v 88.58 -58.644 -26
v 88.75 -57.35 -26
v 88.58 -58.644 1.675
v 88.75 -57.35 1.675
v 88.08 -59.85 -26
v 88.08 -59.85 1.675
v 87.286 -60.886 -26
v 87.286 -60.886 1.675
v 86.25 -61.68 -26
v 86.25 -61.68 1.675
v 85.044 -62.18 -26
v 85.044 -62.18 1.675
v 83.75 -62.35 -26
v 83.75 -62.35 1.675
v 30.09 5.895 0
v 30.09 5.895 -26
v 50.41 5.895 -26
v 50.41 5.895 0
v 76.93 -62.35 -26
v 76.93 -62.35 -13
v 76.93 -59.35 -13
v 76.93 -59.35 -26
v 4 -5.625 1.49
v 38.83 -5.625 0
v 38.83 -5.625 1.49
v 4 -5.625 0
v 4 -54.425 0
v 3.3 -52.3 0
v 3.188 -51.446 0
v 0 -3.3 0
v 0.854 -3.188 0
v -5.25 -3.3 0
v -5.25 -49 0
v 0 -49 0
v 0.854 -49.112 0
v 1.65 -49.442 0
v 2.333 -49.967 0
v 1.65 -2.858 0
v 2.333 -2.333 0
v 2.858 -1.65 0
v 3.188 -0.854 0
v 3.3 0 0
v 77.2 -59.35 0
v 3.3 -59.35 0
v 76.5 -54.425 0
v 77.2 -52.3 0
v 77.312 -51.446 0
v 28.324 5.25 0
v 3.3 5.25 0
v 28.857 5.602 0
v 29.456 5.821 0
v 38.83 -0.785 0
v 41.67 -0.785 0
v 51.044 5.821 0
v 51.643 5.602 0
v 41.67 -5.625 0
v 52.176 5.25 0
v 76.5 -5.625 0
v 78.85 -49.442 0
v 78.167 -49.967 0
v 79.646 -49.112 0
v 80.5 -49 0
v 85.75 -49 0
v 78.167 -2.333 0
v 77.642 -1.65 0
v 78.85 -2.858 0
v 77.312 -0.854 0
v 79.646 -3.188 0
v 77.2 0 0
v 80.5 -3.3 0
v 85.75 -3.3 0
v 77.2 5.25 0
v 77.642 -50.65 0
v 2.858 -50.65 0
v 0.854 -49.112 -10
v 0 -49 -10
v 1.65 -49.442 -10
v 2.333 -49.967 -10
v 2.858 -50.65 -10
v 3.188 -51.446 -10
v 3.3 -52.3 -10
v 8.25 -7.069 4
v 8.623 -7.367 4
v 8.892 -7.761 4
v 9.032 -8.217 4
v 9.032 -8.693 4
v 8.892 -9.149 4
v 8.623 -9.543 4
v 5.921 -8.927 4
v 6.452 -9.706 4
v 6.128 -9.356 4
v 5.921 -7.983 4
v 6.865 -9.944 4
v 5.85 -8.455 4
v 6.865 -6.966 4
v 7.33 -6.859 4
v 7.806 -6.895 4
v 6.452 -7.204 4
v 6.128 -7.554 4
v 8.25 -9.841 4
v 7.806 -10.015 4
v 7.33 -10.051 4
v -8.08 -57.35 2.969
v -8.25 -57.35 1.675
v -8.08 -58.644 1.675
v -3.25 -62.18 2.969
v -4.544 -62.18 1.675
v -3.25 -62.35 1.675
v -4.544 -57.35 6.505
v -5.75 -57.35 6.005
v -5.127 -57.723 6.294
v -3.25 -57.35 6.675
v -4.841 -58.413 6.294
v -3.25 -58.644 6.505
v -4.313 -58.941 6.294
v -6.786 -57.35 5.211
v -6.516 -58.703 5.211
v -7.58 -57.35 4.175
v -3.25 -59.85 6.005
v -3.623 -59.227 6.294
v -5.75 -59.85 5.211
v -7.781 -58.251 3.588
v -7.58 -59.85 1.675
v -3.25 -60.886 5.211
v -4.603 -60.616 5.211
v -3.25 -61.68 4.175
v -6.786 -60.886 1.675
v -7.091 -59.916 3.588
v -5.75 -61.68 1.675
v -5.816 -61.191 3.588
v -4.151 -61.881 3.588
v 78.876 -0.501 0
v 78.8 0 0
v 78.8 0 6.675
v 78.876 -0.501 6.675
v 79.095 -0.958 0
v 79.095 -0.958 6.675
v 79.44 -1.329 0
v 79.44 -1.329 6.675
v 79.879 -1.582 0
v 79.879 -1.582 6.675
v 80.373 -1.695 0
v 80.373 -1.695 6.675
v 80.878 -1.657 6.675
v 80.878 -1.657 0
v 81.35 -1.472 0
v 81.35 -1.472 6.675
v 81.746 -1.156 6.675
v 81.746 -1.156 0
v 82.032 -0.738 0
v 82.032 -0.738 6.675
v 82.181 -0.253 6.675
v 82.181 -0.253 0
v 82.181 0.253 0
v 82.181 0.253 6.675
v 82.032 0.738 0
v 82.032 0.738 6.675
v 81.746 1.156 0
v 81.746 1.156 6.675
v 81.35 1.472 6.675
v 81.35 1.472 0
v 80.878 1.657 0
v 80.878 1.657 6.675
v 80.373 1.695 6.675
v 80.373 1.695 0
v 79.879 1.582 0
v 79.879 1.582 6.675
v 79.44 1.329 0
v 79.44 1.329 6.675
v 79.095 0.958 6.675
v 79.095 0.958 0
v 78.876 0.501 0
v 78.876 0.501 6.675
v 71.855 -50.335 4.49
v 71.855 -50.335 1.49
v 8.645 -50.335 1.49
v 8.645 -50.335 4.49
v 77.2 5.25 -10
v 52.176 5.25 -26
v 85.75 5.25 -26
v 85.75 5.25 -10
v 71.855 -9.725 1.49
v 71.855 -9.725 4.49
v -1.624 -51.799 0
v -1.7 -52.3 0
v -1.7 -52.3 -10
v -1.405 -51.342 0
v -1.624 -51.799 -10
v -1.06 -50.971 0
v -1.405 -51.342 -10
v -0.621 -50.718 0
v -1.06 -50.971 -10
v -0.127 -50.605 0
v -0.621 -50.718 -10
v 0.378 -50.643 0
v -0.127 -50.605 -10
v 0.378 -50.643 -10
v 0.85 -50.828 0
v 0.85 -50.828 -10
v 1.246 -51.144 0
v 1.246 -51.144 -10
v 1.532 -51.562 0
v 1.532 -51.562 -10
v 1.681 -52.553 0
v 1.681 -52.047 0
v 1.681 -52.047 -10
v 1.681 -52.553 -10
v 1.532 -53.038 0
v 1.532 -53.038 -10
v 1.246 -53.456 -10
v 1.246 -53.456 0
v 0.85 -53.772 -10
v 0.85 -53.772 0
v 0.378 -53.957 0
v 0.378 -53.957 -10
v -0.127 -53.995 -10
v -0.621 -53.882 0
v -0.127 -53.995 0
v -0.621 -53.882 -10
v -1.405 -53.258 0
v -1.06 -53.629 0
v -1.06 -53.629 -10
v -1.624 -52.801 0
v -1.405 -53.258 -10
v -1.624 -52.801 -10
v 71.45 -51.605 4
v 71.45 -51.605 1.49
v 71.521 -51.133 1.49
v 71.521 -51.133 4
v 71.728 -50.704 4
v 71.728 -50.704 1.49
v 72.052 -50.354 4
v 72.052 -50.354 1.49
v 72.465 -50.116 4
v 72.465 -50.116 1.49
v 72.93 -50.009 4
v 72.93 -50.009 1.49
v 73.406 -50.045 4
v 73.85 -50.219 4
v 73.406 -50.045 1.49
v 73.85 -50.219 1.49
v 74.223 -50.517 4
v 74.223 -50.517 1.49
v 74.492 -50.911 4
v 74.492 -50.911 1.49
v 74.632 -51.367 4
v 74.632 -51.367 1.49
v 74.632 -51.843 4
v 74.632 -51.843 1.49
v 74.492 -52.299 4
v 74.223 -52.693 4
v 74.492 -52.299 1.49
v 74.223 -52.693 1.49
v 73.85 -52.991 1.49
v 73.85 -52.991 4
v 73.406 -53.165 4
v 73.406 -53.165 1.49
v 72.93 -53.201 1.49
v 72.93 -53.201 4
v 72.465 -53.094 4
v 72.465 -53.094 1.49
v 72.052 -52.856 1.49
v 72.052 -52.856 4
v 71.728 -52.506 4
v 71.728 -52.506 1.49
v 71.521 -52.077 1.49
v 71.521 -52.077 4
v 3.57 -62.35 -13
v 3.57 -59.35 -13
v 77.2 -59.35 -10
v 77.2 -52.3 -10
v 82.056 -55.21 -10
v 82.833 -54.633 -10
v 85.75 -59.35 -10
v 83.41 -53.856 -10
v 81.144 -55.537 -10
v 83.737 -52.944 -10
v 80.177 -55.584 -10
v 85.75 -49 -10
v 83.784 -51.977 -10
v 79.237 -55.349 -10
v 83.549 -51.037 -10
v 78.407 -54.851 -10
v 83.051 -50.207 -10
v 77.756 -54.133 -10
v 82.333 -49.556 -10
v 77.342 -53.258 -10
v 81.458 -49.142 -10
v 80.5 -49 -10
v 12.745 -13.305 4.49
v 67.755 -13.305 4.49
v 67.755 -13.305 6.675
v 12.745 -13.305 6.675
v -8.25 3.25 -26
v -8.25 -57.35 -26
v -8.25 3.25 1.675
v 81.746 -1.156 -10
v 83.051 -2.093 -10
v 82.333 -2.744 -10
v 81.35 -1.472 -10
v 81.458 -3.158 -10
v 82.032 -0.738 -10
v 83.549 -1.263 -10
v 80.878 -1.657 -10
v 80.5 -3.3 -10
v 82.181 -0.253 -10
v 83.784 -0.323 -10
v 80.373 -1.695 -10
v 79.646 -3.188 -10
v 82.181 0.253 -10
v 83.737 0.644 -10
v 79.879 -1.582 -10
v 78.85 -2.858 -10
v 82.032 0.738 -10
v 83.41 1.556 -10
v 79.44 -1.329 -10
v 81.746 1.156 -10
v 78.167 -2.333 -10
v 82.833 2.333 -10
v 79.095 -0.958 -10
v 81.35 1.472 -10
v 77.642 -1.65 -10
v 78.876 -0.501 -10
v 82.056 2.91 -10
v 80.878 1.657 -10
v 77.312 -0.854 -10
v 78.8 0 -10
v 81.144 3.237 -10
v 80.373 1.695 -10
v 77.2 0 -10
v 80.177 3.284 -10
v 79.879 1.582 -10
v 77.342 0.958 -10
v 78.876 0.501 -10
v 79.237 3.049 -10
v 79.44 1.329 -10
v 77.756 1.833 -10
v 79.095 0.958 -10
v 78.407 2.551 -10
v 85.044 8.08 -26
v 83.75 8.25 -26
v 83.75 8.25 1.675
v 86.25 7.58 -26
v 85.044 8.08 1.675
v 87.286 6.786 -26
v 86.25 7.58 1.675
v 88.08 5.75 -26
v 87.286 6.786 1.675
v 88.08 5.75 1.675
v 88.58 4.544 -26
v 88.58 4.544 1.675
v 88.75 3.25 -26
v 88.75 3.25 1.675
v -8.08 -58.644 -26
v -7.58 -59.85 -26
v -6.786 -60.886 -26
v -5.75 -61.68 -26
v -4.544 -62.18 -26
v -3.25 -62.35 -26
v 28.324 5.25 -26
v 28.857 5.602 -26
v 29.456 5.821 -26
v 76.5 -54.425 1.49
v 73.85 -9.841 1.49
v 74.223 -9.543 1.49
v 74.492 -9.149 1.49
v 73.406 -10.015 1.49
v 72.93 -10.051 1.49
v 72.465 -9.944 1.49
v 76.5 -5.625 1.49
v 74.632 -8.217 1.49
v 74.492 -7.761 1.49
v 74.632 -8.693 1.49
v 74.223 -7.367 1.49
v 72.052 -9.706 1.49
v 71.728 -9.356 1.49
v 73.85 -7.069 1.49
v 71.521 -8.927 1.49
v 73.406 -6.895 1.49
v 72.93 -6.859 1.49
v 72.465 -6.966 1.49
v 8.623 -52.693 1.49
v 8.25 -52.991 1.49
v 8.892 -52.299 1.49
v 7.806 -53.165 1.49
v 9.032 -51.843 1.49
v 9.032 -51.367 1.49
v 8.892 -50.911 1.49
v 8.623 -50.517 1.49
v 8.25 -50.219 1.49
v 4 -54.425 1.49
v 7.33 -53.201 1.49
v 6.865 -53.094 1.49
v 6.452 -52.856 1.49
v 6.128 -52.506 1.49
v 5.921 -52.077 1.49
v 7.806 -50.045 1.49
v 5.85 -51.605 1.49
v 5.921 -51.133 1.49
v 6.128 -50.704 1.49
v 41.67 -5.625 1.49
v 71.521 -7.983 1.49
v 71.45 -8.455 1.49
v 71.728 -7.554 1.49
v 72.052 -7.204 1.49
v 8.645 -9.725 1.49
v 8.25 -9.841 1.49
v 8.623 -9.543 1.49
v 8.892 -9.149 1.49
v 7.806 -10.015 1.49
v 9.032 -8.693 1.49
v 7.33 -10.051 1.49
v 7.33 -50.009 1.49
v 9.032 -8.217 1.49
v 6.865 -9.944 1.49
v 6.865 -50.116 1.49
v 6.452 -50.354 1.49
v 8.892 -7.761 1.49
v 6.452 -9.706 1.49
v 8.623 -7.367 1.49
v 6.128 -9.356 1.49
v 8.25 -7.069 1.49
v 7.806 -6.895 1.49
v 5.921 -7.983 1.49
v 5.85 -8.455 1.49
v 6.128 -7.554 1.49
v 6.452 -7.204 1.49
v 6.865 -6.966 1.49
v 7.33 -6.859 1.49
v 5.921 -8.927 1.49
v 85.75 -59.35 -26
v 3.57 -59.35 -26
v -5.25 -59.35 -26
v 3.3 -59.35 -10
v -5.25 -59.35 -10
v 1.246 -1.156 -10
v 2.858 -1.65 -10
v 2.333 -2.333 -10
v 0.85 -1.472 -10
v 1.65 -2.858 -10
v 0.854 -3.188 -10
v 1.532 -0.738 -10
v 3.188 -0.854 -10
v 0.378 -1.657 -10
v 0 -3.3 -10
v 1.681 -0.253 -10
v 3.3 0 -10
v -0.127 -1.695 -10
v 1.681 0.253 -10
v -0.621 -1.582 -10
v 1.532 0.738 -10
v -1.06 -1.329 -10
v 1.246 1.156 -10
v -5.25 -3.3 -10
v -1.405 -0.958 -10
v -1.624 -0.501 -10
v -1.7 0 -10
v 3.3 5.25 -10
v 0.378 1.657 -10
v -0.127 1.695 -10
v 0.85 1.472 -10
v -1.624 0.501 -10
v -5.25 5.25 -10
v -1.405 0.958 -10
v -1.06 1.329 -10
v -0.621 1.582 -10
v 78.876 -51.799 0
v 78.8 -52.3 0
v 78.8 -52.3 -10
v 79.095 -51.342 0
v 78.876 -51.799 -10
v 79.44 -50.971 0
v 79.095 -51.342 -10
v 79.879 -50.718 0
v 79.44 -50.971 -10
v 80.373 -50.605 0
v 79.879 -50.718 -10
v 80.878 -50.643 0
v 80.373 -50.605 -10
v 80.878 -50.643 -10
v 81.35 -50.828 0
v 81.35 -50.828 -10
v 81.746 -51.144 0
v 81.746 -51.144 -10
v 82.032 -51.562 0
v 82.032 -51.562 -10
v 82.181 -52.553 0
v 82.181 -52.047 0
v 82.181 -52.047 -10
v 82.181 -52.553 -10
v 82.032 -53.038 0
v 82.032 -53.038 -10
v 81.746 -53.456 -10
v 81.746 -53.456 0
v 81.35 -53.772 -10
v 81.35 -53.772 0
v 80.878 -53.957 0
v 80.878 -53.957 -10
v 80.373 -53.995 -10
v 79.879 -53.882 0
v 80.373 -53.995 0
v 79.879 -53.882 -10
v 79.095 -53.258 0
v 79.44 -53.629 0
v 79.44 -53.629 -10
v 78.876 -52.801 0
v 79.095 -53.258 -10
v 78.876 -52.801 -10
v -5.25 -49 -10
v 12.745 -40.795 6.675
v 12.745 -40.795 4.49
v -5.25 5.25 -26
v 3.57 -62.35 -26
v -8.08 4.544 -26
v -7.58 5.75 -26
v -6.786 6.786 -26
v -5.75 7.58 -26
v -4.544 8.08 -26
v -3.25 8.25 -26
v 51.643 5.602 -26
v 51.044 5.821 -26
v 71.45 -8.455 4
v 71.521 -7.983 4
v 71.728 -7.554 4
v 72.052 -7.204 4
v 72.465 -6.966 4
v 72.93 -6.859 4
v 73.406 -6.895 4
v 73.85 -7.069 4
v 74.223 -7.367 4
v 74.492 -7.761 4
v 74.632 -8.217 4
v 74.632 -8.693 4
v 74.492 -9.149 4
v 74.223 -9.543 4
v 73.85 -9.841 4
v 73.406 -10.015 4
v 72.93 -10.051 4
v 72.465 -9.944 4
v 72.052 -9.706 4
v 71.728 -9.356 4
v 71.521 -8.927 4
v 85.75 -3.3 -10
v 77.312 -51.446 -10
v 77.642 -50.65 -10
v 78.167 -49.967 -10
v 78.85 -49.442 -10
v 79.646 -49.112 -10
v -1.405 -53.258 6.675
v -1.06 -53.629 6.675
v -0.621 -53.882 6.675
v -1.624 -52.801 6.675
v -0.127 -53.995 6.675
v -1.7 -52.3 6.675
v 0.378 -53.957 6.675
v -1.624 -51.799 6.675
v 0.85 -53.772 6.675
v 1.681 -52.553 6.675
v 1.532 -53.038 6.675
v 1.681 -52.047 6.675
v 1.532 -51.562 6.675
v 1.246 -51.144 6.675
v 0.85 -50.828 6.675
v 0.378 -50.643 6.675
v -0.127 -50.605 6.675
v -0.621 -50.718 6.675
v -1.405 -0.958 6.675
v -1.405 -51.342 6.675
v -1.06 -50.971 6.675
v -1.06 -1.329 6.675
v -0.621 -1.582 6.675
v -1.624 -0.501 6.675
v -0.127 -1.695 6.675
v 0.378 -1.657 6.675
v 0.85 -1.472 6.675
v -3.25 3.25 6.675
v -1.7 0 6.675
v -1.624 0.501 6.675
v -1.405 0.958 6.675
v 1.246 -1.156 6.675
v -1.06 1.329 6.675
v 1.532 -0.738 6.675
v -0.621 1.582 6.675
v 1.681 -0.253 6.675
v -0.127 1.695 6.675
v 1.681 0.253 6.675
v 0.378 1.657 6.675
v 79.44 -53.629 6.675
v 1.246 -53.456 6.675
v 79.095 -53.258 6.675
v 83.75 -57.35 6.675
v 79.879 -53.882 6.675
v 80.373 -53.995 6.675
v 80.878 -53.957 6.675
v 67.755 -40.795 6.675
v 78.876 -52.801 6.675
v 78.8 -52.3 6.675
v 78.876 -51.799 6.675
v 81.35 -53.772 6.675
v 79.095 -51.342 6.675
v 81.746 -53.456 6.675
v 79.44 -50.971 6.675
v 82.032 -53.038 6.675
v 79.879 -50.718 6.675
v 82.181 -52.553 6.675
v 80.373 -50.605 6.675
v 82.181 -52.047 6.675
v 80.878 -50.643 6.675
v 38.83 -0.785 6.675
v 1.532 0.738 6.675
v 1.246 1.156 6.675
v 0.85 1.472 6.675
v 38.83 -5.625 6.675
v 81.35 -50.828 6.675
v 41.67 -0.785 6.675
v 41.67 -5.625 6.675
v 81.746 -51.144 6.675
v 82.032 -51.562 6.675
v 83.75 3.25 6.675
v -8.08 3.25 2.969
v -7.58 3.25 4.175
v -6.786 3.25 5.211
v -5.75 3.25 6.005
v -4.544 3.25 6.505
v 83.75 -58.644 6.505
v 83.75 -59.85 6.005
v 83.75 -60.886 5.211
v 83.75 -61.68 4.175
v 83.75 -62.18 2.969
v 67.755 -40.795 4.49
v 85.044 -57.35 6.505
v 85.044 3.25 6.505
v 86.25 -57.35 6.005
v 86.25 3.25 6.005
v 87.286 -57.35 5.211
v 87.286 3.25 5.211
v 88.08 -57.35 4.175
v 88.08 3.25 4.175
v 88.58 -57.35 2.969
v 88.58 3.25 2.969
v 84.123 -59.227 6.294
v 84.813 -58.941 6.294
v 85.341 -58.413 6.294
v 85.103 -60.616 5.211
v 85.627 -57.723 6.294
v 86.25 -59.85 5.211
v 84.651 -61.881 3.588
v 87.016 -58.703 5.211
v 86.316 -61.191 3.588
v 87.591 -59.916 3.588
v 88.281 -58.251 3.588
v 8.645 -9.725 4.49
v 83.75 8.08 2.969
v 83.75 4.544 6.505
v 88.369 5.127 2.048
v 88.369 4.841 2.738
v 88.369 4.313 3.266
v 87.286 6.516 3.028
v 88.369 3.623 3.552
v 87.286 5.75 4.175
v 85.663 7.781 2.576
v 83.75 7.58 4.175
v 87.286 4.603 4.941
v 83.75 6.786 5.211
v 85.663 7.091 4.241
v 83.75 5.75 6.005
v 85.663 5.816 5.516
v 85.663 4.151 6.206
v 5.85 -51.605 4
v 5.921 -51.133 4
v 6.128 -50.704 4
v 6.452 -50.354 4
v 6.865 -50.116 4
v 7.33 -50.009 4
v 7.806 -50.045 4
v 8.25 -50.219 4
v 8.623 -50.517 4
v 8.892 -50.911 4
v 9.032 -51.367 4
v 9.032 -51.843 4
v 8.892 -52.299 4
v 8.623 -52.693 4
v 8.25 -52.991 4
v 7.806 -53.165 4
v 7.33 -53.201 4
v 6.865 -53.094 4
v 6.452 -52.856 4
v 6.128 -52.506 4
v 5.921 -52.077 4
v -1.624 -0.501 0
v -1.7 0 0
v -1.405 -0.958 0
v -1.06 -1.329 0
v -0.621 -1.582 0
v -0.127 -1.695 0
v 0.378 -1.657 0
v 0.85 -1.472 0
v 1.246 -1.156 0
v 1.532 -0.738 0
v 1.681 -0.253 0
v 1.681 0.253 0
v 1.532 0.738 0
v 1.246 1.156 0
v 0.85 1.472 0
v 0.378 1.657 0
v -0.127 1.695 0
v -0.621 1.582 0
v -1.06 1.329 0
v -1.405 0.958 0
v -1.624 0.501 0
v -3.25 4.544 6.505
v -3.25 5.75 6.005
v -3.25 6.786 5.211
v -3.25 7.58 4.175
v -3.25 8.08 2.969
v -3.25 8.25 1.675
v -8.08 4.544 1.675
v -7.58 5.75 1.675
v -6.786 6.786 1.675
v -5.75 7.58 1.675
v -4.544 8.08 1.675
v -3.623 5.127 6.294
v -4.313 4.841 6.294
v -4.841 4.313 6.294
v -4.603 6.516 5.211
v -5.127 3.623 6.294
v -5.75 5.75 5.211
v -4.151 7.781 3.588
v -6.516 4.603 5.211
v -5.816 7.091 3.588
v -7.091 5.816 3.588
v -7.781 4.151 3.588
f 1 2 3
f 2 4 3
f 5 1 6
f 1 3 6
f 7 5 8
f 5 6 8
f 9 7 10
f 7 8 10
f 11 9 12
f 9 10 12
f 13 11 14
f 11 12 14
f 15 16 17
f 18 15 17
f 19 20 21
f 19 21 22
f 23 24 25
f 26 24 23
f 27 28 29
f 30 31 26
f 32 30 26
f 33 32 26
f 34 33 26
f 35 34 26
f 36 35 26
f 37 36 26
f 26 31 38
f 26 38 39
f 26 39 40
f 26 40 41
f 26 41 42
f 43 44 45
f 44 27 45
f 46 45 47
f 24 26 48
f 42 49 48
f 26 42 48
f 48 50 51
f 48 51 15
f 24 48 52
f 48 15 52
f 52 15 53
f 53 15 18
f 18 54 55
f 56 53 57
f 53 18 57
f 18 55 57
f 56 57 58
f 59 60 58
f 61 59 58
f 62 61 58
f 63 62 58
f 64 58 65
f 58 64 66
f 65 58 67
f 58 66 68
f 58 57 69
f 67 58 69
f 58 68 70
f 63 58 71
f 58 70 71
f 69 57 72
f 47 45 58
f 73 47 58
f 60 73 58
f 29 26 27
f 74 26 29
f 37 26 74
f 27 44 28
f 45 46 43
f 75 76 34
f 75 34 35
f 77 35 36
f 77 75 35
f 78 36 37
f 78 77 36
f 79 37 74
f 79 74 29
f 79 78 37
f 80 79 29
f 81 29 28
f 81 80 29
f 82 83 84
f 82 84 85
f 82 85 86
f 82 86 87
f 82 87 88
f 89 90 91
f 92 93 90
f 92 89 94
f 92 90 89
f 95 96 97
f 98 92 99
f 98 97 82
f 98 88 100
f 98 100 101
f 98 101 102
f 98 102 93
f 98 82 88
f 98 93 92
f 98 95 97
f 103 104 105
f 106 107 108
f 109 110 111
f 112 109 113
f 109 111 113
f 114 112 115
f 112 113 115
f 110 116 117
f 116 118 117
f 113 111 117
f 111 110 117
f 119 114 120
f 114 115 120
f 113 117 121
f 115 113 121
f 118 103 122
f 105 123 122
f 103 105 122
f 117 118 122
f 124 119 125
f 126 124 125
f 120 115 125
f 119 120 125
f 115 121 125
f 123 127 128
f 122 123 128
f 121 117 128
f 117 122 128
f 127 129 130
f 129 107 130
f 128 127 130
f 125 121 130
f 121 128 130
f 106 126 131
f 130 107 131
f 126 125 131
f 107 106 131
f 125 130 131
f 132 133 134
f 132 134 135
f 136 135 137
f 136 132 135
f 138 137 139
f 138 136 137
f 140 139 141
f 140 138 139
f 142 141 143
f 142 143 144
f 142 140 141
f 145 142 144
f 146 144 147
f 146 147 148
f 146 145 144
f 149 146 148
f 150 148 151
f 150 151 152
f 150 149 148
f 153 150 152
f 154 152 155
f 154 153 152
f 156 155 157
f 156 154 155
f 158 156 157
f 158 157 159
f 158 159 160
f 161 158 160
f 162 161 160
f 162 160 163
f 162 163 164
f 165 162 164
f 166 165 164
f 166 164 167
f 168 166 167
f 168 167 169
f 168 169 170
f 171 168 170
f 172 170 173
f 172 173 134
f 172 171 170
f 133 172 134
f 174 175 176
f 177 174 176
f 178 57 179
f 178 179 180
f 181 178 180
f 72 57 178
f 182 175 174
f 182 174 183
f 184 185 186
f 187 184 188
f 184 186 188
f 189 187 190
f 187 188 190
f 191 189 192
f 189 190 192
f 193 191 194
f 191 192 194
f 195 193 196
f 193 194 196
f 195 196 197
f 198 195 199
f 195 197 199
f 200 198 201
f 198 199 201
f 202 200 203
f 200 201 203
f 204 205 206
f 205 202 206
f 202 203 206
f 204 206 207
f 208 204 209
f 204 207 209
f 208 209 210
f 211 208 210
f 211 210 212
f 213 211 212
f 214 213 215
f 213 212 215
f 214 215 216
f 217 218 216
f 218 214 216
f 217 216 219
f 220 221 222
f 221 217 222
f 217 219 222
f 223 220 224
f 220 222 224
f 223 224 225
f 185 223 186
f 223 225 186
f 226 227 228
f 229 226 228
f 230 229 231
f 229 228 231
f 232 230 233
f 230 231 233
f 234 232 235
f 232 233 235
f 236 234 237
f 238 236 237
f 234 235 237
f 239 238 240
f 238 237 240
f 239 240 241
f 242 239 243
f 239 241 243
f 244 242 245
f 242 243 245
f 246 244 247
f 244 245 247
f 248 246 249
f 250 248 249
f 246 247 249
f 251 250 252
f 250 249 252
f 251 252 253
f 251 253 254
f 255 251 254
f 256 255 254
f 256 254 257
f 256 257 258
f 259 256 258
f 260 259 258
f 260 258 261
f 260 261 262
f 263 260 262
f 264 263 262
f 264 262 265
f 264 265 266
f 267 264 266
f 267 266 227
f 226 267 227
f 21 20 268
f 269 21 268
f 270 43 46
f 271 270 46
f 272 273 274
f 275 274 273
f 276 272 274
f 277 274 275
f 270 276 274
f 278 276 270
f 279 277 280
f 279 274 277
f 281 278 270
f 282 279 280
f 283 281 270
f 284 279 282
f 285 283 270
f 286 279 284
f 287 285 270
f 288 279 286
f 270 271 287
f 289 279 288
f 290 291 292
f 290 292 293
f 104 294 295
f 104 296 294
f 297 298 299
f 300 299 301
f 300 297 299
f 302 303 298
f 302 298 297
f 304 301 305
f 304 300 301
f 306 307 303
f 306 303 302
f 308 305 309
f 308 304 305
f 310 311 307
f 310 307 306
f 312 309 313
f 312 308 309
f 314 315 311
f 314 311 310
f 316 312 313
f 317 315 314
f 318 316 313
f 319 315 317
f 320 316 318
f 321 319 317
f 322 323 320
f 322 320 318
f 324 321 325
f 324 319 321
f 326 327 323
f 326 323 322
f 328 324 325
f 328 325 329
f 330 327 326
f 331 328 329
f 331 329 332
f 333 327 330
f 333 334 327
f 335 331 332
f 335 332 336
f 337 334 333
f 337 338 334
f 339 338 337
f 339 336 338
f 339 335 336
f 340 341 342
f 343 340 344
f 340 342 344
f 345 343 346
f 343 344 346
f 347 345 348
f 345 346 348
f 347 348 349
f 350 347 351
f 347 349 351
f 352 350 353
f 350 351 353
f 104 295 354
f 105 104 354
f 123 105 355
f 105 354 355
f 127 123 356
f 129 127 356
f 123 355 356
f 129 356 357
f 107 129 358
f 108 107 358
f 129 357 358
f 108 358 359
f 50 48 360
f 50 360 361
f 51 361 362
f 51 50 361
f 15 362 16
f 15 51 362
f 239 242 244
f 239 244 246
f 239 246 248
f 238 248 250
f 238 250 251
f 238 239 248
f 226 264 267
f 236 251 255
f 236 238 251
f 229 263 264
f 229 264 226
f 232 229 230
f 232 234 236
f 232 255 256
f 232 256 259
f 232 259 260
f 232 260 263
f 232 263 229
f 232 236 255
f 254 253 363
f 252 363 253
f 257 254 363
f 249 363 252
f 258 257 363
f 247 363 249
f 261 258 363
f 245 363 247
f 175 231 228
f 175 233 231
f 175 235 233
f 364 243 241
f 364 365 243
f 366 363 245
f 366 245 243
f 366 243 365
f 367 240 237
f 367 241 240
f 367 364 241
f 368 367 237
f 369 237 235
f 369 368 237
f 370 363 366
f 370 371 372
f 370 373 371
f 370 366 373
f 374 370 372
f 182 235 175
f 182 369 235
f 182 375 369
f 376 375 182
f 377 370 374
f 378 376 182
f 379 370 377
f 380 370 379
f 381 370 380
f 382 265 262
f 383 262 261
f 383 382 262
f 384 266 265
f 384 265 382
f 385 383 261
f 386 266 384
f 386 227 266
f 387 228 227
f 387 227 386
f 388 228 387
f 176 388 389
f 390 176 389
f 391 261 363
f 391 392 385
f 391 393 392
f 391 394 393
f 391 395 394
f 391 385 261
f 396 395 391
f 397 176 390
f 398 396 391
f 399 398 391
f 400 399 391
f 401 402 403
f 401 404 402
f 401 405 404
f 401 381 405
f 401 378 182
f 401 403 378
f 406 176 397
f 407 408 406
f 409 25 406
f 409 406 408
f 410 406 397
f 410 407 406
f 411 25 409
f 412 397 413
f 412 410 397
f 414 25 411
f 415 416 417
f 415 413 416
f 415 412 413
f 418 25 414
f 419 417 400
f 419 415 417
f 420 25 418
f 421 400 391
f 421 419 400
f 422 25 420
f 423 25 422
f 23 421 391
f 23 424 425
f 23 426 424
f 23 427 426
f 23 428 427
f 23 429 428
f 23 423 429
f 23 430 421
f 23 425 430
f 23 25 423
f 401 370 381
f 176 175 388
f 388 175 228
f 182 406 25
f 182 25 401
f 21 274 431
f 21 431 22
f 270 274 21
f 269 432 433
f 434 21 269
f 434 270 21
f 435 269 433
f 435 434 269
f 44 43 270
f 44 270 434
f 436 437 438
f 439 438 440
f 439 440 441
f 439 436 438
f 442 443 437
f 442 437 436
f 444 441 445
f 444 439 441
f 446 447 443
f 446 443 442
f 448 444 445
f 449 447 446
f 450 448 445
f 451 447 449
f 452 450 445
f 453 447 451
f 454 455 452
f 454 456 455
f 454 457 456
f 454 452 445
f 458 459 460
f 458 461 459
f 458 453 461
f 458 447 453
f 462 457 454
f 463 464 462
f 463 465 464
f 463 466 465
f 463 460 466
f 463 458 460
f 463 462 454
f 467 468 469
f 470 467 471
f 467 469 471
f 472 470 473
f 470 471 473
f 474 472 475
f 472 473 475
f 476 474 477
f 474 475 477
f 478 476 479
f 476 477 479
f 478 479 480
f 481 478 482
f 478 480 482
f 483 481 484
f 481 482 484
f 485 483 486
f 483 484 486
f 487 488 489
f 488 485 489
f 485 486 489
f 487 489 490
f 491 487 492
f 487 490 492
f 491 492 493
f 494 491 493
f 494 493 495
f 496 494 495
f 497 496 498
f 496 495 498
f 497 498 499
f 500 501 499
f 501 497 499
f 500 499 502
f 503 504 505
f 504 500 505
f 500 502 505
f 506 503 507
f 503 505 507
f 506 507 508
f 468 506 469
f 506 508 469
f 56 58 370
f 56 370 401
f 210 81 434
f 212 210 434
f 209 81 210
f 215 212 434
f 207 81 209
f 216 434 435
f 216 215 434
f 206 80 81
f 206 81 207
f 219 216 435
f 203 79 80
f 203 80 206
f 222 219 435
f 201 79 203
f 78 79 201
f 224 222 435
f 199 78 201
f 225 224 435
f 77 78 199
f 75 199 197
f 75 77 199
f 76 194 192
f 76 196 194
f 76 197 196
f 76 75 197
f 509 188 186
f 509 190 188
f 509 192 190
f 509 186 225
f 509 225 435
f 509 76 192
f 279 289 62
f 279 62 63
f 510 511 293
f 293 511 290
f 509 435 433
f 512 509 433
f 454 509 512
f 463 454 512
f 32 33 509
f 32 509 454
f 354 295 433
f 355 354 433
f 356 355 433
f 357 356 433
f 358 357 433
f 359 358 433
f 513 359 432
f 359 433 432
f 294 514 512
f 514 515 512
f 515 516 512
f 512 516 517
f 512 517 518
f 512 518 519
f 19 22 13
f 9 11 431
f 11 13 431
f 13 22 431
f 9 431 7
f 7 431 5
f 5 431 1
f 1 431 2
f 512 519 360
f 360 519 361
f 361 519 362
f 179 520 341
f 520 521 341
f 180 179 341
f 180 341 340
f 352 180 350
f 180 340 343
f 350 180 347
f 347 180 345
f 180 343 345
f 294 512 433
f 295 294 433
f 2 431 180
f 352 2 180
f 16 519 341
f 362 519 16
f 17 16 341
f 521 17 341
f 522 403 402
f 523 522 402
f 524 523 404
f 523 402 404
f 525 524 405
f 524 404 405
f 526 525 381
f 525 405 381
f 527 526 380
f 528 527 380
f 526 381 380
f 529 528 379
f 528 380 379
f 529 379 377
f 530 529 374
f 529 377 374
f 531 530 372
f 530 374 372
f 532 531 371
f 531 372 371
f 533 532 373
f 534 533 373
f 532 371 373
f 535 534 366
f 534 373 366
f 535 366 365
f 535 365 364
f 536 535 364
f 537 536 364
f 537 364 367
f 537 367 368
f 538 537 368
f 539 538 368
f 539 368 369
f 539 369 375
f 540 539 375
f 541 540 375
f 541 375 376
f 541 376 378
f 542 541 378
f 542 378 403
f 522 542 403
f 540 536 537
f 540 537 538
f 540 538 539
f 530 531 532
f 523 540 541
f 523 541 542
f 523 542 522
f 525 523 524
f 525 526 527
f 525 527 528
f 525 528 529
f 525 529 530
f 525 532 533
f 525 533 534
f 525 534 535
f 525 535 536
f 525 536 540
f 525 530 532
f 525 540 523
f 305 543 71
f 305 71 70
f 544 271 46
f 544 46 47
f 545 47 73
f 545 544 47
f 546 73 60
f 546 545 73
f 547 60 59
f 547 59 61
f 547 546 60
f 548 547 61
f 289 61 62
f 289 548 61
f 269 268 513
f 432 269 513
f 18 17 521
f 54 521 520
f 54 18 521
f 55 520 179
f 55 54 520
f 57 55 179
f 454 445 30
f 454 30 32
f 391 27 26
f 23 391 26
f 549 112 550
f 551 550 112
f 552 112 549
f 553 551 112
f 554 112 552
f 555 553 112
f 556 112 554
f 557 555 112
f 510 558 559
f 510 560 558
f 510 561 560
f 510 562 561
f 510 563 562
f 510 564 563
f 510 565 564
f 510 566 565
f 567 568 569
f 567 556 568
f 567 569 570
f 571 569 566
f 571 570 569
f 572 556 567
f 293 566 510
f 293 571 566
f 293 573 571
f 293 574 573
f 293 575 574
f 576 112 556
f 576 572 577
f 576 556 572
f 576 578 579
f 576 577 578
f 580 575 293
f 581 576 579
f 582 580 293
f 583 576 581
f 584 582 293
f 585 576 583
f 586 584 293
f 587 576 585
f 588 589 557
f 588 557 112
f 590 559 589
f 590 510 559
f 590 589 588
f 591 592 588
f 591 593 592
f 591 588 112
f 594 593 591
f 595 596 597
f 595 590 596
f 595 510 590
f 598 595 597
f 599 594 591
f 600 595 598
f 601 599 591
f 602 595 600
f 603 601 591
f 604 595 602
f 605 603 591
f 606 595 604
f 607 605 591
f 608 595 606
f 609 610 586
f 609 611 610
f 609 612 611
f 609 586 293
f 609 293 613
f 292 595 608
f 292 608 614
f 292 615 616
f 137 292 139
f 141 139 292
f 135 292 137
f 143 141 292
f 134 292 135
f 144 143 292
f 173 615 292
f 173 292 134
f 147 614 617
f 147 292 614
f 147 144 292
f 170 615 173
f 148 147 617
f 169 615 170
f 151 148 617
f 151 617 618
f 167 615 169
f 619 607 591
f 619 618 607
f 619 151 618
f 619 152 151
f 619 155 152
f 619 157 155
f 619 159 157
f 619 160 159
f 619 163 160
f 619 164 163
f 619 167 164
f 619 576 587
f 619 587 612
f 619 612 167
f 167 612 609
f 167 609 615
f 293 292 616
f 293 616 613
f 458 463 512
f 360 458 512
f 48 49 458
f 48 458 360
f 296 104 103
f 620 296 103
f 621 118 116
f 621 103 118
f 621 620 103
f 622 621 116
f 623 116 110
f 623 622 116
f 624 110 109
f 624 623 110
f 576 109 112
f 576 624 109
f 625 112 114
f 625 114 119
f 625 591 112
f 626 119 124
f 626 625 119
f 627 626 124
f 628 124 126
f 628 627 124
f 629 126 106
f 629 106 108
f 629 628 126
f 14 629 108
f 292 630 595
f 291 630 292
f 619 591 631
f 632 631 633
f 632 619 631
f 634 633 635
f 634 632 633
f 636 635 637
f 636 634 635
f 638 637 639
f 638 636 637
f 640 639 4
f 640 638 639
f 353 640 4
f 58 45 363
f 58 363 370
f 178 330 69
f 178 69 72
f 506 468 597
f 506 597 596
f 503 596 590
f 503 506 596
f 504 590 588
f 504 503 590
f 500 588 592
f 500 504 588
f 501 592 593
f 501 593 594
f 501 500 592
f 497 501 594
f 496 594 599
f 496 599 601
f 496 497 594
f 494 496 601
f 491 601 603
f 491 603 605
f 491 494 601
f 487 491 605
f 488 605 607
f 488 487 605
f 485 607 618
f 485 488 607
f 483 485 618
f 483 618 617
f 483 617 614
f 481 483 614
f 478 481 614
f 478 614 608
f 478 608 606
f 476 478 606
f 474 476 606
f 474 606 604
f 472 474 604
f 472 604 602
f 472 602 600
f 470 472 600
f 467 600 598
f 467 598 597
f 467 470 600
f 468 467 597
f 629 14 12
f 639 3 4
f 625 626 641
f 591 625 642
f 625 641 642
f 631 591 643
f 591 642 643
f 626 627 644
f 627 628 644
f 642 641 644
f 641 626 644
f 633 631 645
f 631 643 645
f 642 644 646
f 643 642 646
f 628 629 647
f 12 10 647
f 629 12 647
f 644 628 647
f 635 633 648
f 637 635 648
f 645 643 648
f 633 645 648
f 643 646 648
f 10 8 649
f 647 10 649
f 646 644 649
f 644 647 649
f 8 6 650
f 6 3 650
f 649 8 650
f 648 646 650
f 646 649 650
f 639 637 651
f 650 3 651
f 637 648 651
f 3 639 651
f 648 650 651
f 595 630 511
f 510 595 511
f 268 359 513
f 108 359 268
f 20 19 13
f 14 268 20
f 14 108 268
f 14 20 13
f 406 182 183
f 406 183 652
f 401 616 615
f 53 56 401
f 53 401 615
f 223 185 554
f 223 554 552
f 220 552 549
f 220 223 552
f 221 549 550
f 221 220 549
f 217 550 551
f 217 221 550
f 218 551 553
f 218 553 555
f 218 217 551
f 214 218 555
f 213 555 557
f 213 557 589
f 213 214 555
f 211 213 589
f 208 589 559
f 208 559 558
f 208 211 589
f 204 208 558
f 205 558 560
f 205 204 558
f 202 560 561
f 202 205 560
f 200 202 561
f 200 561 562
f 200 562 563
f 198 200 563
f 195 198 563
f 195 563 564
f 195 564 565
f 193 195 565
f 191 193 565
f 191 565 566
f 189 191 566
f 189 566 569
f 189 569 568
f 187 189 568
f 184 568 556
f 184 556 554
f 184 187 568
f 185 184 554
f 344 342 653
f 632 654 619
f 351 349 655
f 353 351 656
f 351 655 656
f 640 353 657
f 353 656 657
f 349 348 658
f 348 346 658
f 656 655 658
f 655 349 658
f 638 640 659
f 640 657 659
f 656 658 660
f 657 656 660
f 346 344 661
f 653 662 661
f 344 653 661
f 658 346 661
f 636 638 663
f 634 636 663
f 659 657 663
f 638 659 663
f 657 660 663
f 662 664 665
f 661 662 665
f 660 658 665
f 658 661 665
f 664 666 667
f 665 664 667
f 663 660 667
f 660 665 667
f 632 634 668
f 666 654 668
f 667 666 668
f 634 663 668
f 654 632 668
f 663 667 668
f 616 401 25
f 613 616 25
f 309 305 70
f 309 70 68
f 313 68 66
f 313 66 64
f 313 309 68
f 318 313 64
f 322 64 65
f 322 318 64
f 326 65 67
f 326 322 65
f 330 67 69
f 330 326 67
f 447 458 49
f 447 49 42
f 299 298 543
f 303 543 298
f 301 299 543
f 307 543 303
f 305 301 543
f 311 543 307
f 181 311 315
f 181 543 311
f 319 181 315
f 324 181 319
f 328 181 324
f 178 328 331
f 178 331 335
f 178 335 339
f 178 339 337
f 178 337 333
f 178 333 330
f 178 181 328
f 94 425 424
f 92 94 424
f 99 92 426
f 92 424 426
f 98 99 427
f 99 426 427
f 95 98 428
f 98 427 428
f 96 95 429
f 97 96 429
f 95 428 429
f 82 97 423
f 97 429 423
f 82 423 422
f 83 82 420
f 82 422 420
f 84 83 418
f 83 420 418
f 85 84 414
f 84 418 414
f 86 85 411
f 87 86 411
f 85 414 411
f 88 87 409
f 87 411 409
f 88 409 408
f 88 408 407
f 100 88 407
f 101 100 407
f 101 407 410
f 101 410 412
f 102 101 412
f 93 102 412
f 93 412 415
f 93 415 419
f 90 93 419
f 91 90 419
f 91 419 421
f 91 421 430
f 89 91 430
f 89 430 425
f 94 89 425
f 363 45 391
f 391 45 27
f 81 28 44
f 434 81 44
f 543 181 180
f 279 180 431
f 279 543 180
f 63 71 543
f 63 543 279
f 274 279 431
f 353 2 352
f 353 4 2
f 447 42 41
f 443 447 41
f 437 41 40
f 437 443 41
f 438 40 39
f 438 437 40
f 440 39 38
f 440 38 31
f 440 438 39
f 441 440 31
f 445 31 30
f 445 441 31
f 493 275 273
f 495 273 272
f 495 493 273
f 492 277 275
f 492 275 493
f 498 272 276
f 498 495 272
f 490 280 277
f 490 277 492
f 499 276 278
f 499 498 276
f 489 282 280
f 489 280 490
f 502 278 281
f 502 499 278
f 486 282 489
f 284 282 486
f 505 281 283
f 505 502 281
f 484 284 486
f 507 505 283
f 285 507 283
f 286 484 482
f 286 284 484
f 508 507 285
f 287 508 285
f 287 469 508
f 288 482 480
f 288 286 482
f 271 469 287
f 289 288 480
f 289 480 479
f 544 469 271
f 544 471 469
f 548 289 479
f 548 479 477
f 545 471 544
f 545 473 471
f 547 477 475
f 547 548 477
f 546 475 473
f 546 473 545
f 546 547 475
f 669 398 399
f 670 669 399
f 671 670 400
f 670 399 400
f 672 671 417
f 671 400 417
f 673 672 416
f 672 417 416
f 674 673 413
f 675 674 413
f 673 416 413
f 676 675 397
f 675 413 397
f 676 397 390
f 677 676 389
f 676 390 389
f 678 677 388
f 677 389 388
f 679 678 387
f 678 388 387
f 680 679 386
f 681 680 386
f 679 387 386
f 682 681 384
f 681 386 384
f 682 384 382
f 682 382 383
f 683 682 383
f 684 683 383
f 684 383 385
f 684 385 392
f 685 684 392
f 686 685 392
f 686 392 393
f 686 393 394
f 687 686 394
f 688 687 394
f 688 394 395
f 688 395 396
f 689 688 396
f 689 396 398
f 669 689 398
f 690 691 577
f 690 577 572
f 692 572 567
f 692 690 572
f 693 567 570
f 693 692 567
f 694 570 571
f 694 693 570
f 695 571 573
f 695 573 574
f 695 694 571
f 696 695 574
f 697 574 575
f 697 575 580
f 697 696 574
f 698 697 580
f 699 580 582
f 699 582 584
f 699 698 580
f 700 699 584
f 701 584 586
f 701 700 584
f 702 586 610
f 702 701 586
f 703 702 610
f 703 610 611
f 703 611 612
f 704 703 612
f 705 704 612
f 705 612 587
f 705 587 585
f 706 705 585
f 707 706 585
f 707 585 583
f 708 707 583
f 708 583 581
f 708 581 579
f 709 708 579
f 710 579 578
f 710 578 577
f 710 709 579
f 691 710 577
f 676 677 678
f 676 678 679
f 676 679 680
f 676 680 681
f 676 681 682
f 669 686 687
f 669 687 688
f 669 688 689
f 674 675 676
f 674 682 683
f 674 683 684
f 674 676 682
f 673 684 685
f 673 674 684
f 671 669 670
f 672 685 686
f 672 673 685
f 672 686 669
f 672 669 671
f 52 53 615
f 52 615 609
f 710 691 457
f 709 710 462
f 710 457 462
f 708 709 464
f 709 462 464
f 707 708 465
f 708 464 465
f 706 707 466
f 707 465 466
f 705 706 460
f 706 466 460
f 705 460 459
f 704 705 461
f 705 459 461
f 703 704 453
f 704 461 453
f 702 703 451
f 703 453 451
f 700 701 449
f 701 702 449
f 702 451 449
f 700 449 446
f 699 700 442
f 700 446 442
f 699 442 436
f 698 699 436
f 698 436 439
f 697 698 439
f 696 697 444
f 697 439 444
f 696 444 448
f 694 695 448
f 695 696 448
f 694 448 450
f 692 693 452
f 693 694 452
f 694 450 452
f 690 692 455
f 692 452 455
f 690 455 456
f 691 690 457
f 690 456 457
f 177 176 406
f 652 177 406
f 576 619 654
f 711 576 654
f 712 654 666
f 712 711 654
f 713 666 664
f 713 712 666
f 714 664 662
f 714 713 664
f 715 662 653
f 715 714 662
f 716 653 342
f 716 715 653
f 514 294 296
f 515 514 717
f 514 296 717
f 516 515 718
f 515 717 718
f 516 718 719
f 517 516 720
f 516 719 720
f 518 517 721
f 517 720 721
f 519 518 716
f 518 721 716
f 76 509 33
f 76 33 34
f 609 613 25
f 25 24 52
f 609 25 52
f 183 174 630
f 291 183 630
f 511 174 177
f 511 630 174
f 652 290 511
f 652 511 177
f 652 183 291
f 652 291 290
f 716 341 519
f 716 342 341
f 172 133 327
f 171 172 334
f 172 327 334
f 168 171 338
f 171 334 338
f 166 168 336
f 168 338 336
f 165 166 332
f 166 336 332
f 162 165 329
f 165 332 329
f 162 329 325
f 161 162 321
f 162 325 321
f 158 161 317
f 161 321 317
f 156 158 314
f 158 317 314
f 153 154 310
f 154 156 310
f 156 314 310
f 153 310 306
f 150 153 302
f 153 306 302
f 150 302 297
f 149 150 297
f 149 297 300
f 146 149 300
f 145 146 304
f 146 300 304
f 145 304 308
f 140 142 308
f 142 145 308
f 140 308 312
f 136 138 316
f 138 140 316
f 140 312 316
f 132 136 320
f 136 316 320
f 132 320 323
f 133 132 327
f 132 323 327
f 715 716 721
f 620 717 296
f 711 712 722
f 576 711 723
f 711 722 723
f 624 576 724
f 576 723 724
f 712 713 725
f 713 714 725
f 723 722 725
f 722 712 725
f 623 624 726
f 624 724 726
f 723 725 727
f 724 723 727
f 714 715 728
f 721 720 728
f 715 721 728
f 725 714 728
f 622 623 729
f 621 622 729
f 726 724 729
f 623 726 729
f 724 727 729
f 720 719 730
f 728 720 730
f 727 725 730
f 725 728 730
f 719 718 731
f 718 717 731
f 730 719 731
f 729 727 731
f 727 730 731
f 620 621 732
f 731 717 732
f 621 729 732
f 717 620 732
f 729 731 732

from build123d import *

# Parameters (mm, degrees)
SKETCH1_W           = 45.1
SKETCH1_H           = 63.8
SKETCH1_R           = 1.7
SKETCH1_W_2         = 0.4
SKETCH1_W_3         = 3
BOSS_EXTRUDE1_DEPTH = 6.675
SKETCH1_4_W         = 3
SKETCH1_4_H         = 63.8
BOSS_EXTRUDE2_DEPTH = 26
FILLET1_R           = 5
SKETCH3_W           = 73.36
SKETCH3_H           = 13
CUT_EXTRUDE4_DEPTH  = 3
SKETCH13_W          = 55.01
SKETCH13_H          = 27.49
CUT_EXTRUDE17_DEPTH = 112.535128995
SKETCH8_W           = 72.5
SKETCH8_H           = 48.8
CUT_EXTRUDE11_DEPTH = 1.49
SKETCH5_R           = 1.6
CUT_EXTRUDE8_DEPTH  = 4
CUT_EXTRUDE9_START  = -1.49
SKETCH7_W           = 63.21
SKETCH7_H           = 40.61
SKETCH7_W_2         = 62.41
SKETCH7_H_2         = 39.81
CUT_EXTRUDE9_DEPTH  = 3
SKETCH9_W           = 2.84
SKETCH9_H           = 4.84
SKETCH9_W_2         = 2.44
SKETCH9_H_2         = 4.44
CUT_EXTRUDE15_DEPTH = 112.535128995
SKETCH14_R          = 2.54
CUT_EXTRUDE19_DEPTH = 112.535128995
BOSS_EXTRUDE4_START = 10
SKETCH15_R          = 3.3
SKETCH15_R_2        = 1.7
BOSS_EXTRUDE4_DEPTH = 10


with BuildPart() as part:
    # Sketch1 → Boss-Extrude1 (new body)
    # profile 1 of 10: a face of its own
    with BuildSketch(Plane.XY):
        Polygon((40.25, 4.85), (85.35, 4.85), (85.75, 4.85), (85.75, 5.25), (-5.25, 5.25), (-5.25, 4.85), (-4.85, 4.85), align=None)
    # profile 2 of 10: a face of its own
    with BuildSketch(Plane.XY):
        with Locations((62.8, -27.05)):
            Rectangle(SKETCH1_W, SKETCH1_H)
        with Locations(Location((80.5, -52.3, 0), (0, 0, 180))):
            Circle(SKETCH1_R, mode=Mode.SUBTRACT)
        with Locations(Location((80.5, 0, 0), (0, 0, 180))):
            Circle(SKETCH1_R, mode=Mode.SUBTRACT)
    # profile 3 of 10: a face of its own
    with BuildSketch(Plane.XY):
        with Locations((85.55, -27.05)):
            Rectangle(SKETCH1_W_2, SKETCH1_H)
    # profile 4 of 10: a face of its own
    with BuildSketch(Plane.XY):
        Polygon((85.75, 5.25), (85.75, 4.85), (88.75, 4.85), (88.75, 8.25), (-8.25, 8.25), (-8.25, 4.85), (-5.25, 4.85), (-5.25, 5.25), align=None)
    # profile 5 of 10: a face of its own
    with BuildSketch(Plane.XY):
        with Locations((87.25, -27.05)):
            Rectangle(SKETCH1_W_3, SKETCH1_H)
    # profile 6 of 10: a face of its own
    with BuildSketch(Plane.XY):
        with Locations((17.7, -27.05)):
            Rectangle(SKETCH1_W, SKETCH1_H)
        with Locations(Location((0, -52.3, 0), (0, 0, 180))):
            Circle(SKETCH1_R, mode=Mode.SUBTRACT)
        with Locations(Location((0, 0, 0), (0, 0, 180))):
            Circle(SKETCH1_R, mode=Mode.SUBTRACT)
    # profile 7 of 10: a face of its own
    with BuildSketch(Plane.XY):
        Polygon((85.75, -58.95), (85.35, -58.95), (40.25, -58.95), (-4.85, -58.95), (-5.25, -58.95), (-5.25, -59.35), (85.75, -59.35), align=None)
    # profile 8 of 10: a face of its own
    with BuildSketch(Plane.XY):
        Polygon((88.75, -58.95), (85.75, -58.95), (85.75, -59.35), (-5.25, -59.35), (-5.25, -58.95), (-8.25, -58.95), (-8.25, -62.35), (88.75, -62.35), align=None)
    # profile 9 of 10: a face of its own
    with BuildSketch(Plane.XY):
        with Locations((-5.05, -27.05)):
            Rectangle(SKETCH1_W_2, SKETCH1_H)
    # profile 10 of 10: a face of its own
    with BuildSketch(Plane.XY):
        with Locations((-6.75, -27.05)):
            Rectangle(SKETCH1_W_3, SKETCH1_H)
    extrude(amount=BOSS_EXTRUDE1_DEPTH)

    # Sketch1<4> → Boss-Extrude2 (add)
    with BuildSketch(Plane.XY):
        Polygon((85.75, 5.25), (85.75, 4.85), (88.75, 4.85), (88.75, 8.25), (-8.25, 8.25), (-8.25, 4.85), (-5.25, 4.85), (-5.25, 5.25), align=None)
        with Locations((87.25, -27.05)):
            Rectangle(SKETCH1_4_W, SKETCH1_4_H)
        Polygon((88.75, -58.95), (85.75, -58.95), (85.75, -59.35), (-5.25, -59.35), (-5.25, -58.95), (-8.25, -58.95), (-8.25, -62.35), (88.75, -62.35), align=None)
        with Locations((-6.75, -27.05)):
            Rectangle(SKETCH1_4_W, SKETCH1_4_H)
    extrude(amount=-BOSS_EXTRUDE2_DEPTH)

    # Fillet1
    fillet1_edges = [part.edges().sort_by_distance(p)[0] for p in [
        (88.75, -62.35, -9.6625),
        (-8.25, -62.35, -9.6625),
        (-8.25, 8.25, -9.6625),
        (40.25, 8.25, 6.675),
        (88.75, 8.25, -9.6625),
        (-8.25, -27.05, 6.675),
        (40.25, -62.35, 6.675),
        (88.75, -27.05, 6.675),
    ]]
    fillet(fillet1_edges, radius=FILLET1_R)

    # Sketch3 → Cut-Extrude4 (cut)
    with BuildSketch(Plane(origin=(0, -62.35, 0), x_dir=(-1, 0, 0), z_dir=(0, -1, 0))):
        with Locations((-40.25, 19.5)):
            Rectangle(SKETCH3_W, SKETCH3_H)
    extrude(amount=-CUT_EXTRUDE4_DEPTH, mode=Mode.SUBTRACT)

    # Sketch13 → Cut-Extrude17 (cut, through all)
    with BuildSketch(Plane(origin=(0, 0, 0), x_dir=(-1, 0, 0), z_dir=(0, 0, -1))):
        with Locations((-40.25, -27.05)):
            Rectangle(SKETCH13_W, SKETCH13_H)
    extrude(amount=-CUT_EXTRUDE17_DEPTH, mode=Mode.SUBTRACT)

    # Sketch8 → Cut-Extrude11 (cut)
    with BuildSketch(Plane(origin=(0, 0, 0), x_dir=(-1, 0, 0), z_dir=(0, 0, -1))):
        with Locations((-40.25, -30.025)):
            Rectangle(SKETCH8_W, SKETCH8_H)
    extrude(amount=-CUT_EXTRUDE11_DEPTH, mode=Mode.SUBTRACT)

    # Sketch5 → Cut-Extrude8 (cut)
    with BuildSketch(Plane(origin=(0, 0, 0), x_dir=(-1, 0, 0), z_dir=(0, 0, -1))):
        with Locations((-73.05, -8.455)):
            Circle(SKETCH5_R)
        with Locations((-73.05, -51.605)):
            Circle(SKETCH5_R)
        with Locations((-7.45, -51.605)):
            Circle(SKETCH5_R)
        with Locations((-7.45, -8.455)):
            Circle(SKETCH5_R)
    extrude(amount=-CUT_EXTRUDE8_DEPTH, mode=Mode.SUBTRACT)

    # Sketch7 → Cut-Extrude9 (cut)
    # profile 1 of 2: a face of its own
    with BuildSketch(Plane(origin=(0, 0, 0), x_dir=(-1, 0, 0), z_dir=(0, 0, -1)).offset(CUT_EXTRUDE9_START)):
        with Locations((-40.25, -30.03)):
            Rectangle(SKETCH7_W, SKETCH7_H)
        with Locations((-40.25, -30.03)):
            Rectangle(SKETCH7_W_2, SKETCH7_H_2, mode=Mode.SUBTRACT)
    # profile 2 of 2: a face of its own
    with BuildSketch(Plane(origin=(0, 0, 0), x_dir=(-1, 0, 0), z_dir=(0, 0, -1)).offset(CUT_EXTRUDE9_START)):
        with Locations((-40.25, -30.03)):
            Rectangle(SKETCH7_W_2, SKETCH7_H_2)
    extrude(amount=-CUT_EXTRUDE9_DEPTH, mode=Mode.SUBTRACT)

    # Sketch9 → Cut-Extrude15 (cut, through all)
    # profile 1 of 2: a face of its own
    with BuildSketch(Plane(origin=(0, 0, 0), x_dir=(-1, 0, 0), z_dir=(0, 0, -1))):
        with Locations((-40.25, -3.205)):
            Rectangle(SKETCH9_W, SKETCH9_H)
        with Locations((-40.25, -3.205)):
            Rectangle(SKETCH9_W_2, SKETCH9_H_2, mode=Mode.SUBTRACT)
    # profile 2 of 2: a face of its own
    with BuildSketch(Plane(origin=(0, 0, 0), x_dir=(-1, 0, 0), z_dir=(0, 0, -1))):
        with Locations((-40.25, -3.205)):
            Rectangle(SKETCH9_W_2, SKETCH9_H_2)
    extrude(amount=-CUT_EXTRUDE15_DEPTH, mode=Mode.SUBTRACT)

    # Sketch14 → Cut-Extrude19 (cut, through all)
    with BuildSketch(Plane(origin=(0, 0, 0), x_dir=(-1, 0, 0), z_dir=(0, 0, -1))):
        with BuildLine():
            ThreePointArc((-30.09, -12.085), (-31.886051224, -7.748948776), (-27.55, -9.545))
            Line((-27.55, -9.545), (-27.55, -5.625))
            Line((-27.55, -5.625), (-38.83, -5.625))
            Line((-38.83, -5.625), (-38.83, -0.785))
            Line((-38.83, -0.785), (-41.67, -0.785))
            Line((-41.67, -0.785), (-41.67, -5.625))
            Line((-41.67, -5.625), (-52.95, -5.625))
            Line((-52.95, -5.625), (-52.95, -9.545))
            ThreePointArc((-52.95, -9.545), (-50.41, -7.005), (-47.87, -9.545))
            ThreePointArc((-47.87, -9.545), (-48.613948776, -11.341051224), (-50.41, -12.085))
            Line((-50.41, -12.085), (-30.09, -12.085))
        make_face()
        with BuildLine():
            Line((-38.83, -5.625), (-27.55, -5.625))
            Line((-27.55, -5.625), (-27.55, 3.155))
            ThreePointArc((-27.55, 3.155), (-31.274005151, 0.907839169), (-31.526166773, 5.25))
            Line((-31.526166773, 5.25), (-48.973833227, 5.25))
            ThreePointArc((-48.973833227, 5.25), (-48.162839169, 4.339005151), (-47.87, 3.155))
            ThreePointArc((-47.87, 3.155), (-50.41, 0.615), (-52.95, 3.155))
            Line((-52.95, 3.155), (-52.95, -5.625))
            Line((-52.95, -5.625), (-41.67, -5.625))
            Line((-41.67, -5.625), (-41.67, -0.785))
            Line((-41.67, -0.785), (-38.83, -0.785))
            Line((-38.83, -0.785), (-38.83, -5.625))
        make_face()
        with Locations((-50.41, -9.545)):
            Circle(SKETCH14_R)
        with BuildLine():
            Line((-51.846166773, 5.25), (-48.973833227, 5.25))
            ThreePointArc((-48.973833227, 5.25), (-49.658235409, 5.581200734), (-50.41, 5.695))
            ThreePointArc((-50.41, 5.695), (-51.161764591, 5.581200734), (-51.846166773, 5.25))
        make_face()
        with BuildLine():
            ThreePointArc((-47.87, 3.155), (-48.162839169, 4.339005151), (-48.973833227, 5.25))
            Line((-48.973833227, 5.25), (-51.846166773, 5.25))
            ThreePointArc((-51.846166773, 5.25), (-52.657160831, 4.339005151), (-52.95, 3.155))
            ThreePointArc((-52.95, 3.155), (-50.41, 0.615), (-47.87, 3.155))
        make_face()
        with BuildLine():
            ThreePointArc((-31.526166773, 5.25), (-31.274005151, 0.907839169), (-27.55, 3.155))
            ThreePointArc((-27.55, 3.155), (-27.842839169, 4.339005151), (-28.653833227, 5.25))
            Line((-28.653833227, 5.25), (-31.526166773, 5.25))
        make_face()
        with BuildLine():
            Line((-31.526166773, 5.25), (-28.653833227, 5.25))
            ThreePointArc((-28.653833227, 5.25), (-29.338235409, 5.581200734), (-30.09, 5.695))
            ThreePointArc((-30.09, 5.695), (-30.841764591, 5.581200734), (-31.526166773, 5.25))
        make_face()
        with Locations((-30.09, -9.545)):
            Circle(SKETCH14_R)
        with BuildLine():
            Line((-48.973833227, 5.25), (-31.526166773, 5.25))
            ThreePointArc((-31.526166773, 5.25), (-30.841764591, 5.581200734), (-30.09, 5.695))
            Line((-30.09, 5.695), (-50.41, 5.695))
            ThreePointArc((-50.41, 5.695), (-49.658235409, 5.581200734), (-48.973833227, 5.25))
        make_face()
        with BuildLine():
            Line((-27.55, -5.625), (-27.55, -9.545))
            ThreePointArc((-27.55, -9.545), (-28.293948776, -11.341051224), (-30.09, -12.085))
            Line((-30.09, -12.085), (-50.41, -12.085))
            ThreePointArc((-50.41, -12.085), (-52.206051224, -11.341051224), (-52.95, -9.545))
            Line((-52.95, -9.545), (-52.95, -5.625))
            Line((-52.95, -5.625), (-53.15, -5.625))
            Line((-53.15, -5.625), (-53.15, -9.545))
            ThreePointArc((-53.15, -9.545), (-52.34747258, -11.48247258), (-50.41, -12.285))
            Line((-50.41, -12.285), (-30.09, -12.285))
            ThreePointArc((-30.09, -12.285), (-28.15252742, -11.48247258), (-27.35, -9.545))
            Line((-27.35, -9.545), (-27.35, -5.625))
            Line((-27.35, -5.625), (-27.55, -5.625))
        make_face()
        with BuildLine():
            Line((-27.55, 3.155), (-27.55, -5.625))
            Line((-27.55, -5.625), (-27.35, -5.625))
            Line((-27.35, -5.625), (-27.35, 3.155))
            ThreePointArc((-27.35, 3.155), (-27.605417582, 4.310184058), (-28.324051246, 5.25))
            Line((-28.324051246, 5.25), (-28.653833227, 5.25))
            ThreePointArc((-28.653833227, 5.25), (-27.842839169, 4.339005151), (-27.55, 3.155))
        make_face()
        with BuildLine():
            ThreePointArc((-30.09, 5.695), (-29.338235409, 5.581200734), (-28.653833227, 5.25))
            Line((-28.653833227, 5.25), (-28.324051246, 5.25))
            ThreePointArc((-28.324051246, 5.25), (-29.149973405, 5.728703557), (-30.09, 5.895))
            Line((-30.09, 5.895), (-50.41, 5.895))
            ThreePointArc((-50.41, 5.895), (-51.350026595, 5.728703557), (-52.175948754, 5.25))
            Line((-52.175948754, 5.25), (-51.846166773, 5.25))
            ThreePointArc((-51.846166773, 5.25), (-51.161764591, 5.581200734), (-50.41, 5.695))
            Line((-50.41, 5.695), (-30.09, 5.695))
        make_face()
        with BuildLine():
            Line((-53.15, -5.625), (-52.95, -5.625))
            Line((-52.95, -5.625), (-52.95, 3.155))
            ThreePointArc((-52.95, 3.155), (-52.657160831, 4.339005151), (-51.846166773, 5.25))
            Line((-51.846166773, 5.25), (-52.175948754, 5.25))
            ThreePointArc((-52.175948754, 5.25), (-52.894582418, 4.310184058), (-53.15, 3.155))
            Line((-53.15, 3.155), (-53.15, -5.625))
        make_face()
    extrude(amount=CUT_EXTRUDE19_DEPTH, mode=Mode.SUBTRACT)

    # Sketch15 → Boss-Extrude4 (add)
    # profile 1 of 8: a face of its own
    with BuildSketch(Plane(origin=(0, 0, 0), x_dir=(-1, 0, 0), z_dir=(0, 0, -1)).offset(BOSS_EXTRUDE4_START)):
        with BuildLine():
            ThreePointArc((3.3, 0), (2.333452378, -2.333452378), (0, -3.3))
            Line((0, -3.3), (5.25, -3.3))
            Line((5.25, -3.3), (5.25, 5.25))
            Line((5.25, 5.25), (-3.3, 5.25))
            Line((-3.3, 5.25), (-3.3, 0))
            ThreePointArc((-3.3, 0), (0, 3.3), (3.3, 0))
        make_face()
    # profile 2 of 8: a face of its own
    with BuildSketch(Plane(origin=(0, 0, 0), x_dir=(-1, 0, 0), z_dir=(0, 0, -1)).offset(BOSS_EXTRUDE4_START)):
        Circle(SKETCH15_R)
        Circle(SKETCH15_R_2, mode=Mode.SUBTRACT)
    # profile 3 of 8: a face of its own
    with BuildSketch(Plane(origin=(0, 0, 0), x_dir=(-1, 0, 0), z_dir=(0, 0, -1)).offset(BOSS_EXTRUDE4_START)):
        with BuildLine():
            Line((-85.75, 5.25), (-85.75, -3.3))
            Line((-85.75, -3.3), (-80.5, -3.3))
            ThreePointArc((-80.5, -3.3), (-82.833452378, 2.333452378), (-77.2, 0))
            Line((-77.2, 0), (-77.2, 5.25))
            Line((-77.2, 5.25), (-85.75, 5.25))
        make_face()
    # profile 4 of 8: a face of its own
    with BuildSketch(Plane(origin=(0, 0, 0), x_dir=(-1, 0, 0), z_dir=(0, 0, -1)).offset(BOSS_EXTRUDE4_START)):
        with Locations((-80.5, 0)):
            Circle(SKETCH15_R)
        with Locations((-80.5, 0)):
            Circle(SKETCH15_R_2, mode=Mode.SUBTRACT)
    # profile 5 of 8: a face of its own
    with BuildSketch(Plane(origin=(0, 0, 0), x_dir=(-1, 0, 0), z_dir=(0, 0, -1)).offset(BOSS_EXTRUDE4_START)):
        with Locations((-80.5, -52.3)):
            Circle(SKETCH15_R)
        with Locations((-80.5, -52.3)):
            Circle(SKETCH15_R_2, mode=Mode.SUBTRACT)
    # profile 6 of 8: a face of its own
    with BuildSketch(Plane(origin=(0, 0, 0), x_dir=(-1, 0, 0), z_dir=(0, 0, -1)).offset(BOSS_EXTRUDE4_START)):
        with Locations((0, -52.3)):
            Circle(SKETCH15_R)
        with Locations((0, -52.3)):
            Circle(SKETCH15_R_2, mode=Mode.SUBTRACT)
    # profile 7 of 8: a face of its own
    with BuildSketch(Plane(origin=(0, 0, 0), x_dir=(-1, 0, 0), z_dir=(0, 0, -1)).offset(BOSS_EXTRUDE4_START)):
        with BuildLine():
            Line((5.25, -59.35), (5.25, -49))
            Line((5.25, -49), (0, -49))
            ThreePointArc((0, -49), (2.333452378, -49.966547622), (3.3, -52.3))
            ThreePointArc((3.3, -52.3), (0, -55.6), (-3.3, -52.3))
            Line((-3.3, -52.3), (-3.3, -59.35))
            Line((-3.3, -59.35), (5.25, -59.35))
        make_face()
    # profile 8 of 8: a face of its own
    with BuildSketch(Plane(origin=(0, 0, 0), x_dir=(-1, 0, 0), z_dir=(0, 0, -1)).offset(BOSS_EXTRUDE4_START)):
        with BuildLine():
            Line((-85.75, -59.35), (-77.2, -59.35))
            Line((-77.2, -59.35), (-77.2, -52.3))
            ThreePointArc((-77.2, -52.3), (-82.833452378, -54.633452378), (-80.5, -49))
            Line((-80.5, -49), (-85.75, -49))
            Line((-85.75, -49), (-85.75, -59.35))
        make_face()
    extrude(amount=-BOSS_EXTRUDE4_DEPTH)


solid = part.part
